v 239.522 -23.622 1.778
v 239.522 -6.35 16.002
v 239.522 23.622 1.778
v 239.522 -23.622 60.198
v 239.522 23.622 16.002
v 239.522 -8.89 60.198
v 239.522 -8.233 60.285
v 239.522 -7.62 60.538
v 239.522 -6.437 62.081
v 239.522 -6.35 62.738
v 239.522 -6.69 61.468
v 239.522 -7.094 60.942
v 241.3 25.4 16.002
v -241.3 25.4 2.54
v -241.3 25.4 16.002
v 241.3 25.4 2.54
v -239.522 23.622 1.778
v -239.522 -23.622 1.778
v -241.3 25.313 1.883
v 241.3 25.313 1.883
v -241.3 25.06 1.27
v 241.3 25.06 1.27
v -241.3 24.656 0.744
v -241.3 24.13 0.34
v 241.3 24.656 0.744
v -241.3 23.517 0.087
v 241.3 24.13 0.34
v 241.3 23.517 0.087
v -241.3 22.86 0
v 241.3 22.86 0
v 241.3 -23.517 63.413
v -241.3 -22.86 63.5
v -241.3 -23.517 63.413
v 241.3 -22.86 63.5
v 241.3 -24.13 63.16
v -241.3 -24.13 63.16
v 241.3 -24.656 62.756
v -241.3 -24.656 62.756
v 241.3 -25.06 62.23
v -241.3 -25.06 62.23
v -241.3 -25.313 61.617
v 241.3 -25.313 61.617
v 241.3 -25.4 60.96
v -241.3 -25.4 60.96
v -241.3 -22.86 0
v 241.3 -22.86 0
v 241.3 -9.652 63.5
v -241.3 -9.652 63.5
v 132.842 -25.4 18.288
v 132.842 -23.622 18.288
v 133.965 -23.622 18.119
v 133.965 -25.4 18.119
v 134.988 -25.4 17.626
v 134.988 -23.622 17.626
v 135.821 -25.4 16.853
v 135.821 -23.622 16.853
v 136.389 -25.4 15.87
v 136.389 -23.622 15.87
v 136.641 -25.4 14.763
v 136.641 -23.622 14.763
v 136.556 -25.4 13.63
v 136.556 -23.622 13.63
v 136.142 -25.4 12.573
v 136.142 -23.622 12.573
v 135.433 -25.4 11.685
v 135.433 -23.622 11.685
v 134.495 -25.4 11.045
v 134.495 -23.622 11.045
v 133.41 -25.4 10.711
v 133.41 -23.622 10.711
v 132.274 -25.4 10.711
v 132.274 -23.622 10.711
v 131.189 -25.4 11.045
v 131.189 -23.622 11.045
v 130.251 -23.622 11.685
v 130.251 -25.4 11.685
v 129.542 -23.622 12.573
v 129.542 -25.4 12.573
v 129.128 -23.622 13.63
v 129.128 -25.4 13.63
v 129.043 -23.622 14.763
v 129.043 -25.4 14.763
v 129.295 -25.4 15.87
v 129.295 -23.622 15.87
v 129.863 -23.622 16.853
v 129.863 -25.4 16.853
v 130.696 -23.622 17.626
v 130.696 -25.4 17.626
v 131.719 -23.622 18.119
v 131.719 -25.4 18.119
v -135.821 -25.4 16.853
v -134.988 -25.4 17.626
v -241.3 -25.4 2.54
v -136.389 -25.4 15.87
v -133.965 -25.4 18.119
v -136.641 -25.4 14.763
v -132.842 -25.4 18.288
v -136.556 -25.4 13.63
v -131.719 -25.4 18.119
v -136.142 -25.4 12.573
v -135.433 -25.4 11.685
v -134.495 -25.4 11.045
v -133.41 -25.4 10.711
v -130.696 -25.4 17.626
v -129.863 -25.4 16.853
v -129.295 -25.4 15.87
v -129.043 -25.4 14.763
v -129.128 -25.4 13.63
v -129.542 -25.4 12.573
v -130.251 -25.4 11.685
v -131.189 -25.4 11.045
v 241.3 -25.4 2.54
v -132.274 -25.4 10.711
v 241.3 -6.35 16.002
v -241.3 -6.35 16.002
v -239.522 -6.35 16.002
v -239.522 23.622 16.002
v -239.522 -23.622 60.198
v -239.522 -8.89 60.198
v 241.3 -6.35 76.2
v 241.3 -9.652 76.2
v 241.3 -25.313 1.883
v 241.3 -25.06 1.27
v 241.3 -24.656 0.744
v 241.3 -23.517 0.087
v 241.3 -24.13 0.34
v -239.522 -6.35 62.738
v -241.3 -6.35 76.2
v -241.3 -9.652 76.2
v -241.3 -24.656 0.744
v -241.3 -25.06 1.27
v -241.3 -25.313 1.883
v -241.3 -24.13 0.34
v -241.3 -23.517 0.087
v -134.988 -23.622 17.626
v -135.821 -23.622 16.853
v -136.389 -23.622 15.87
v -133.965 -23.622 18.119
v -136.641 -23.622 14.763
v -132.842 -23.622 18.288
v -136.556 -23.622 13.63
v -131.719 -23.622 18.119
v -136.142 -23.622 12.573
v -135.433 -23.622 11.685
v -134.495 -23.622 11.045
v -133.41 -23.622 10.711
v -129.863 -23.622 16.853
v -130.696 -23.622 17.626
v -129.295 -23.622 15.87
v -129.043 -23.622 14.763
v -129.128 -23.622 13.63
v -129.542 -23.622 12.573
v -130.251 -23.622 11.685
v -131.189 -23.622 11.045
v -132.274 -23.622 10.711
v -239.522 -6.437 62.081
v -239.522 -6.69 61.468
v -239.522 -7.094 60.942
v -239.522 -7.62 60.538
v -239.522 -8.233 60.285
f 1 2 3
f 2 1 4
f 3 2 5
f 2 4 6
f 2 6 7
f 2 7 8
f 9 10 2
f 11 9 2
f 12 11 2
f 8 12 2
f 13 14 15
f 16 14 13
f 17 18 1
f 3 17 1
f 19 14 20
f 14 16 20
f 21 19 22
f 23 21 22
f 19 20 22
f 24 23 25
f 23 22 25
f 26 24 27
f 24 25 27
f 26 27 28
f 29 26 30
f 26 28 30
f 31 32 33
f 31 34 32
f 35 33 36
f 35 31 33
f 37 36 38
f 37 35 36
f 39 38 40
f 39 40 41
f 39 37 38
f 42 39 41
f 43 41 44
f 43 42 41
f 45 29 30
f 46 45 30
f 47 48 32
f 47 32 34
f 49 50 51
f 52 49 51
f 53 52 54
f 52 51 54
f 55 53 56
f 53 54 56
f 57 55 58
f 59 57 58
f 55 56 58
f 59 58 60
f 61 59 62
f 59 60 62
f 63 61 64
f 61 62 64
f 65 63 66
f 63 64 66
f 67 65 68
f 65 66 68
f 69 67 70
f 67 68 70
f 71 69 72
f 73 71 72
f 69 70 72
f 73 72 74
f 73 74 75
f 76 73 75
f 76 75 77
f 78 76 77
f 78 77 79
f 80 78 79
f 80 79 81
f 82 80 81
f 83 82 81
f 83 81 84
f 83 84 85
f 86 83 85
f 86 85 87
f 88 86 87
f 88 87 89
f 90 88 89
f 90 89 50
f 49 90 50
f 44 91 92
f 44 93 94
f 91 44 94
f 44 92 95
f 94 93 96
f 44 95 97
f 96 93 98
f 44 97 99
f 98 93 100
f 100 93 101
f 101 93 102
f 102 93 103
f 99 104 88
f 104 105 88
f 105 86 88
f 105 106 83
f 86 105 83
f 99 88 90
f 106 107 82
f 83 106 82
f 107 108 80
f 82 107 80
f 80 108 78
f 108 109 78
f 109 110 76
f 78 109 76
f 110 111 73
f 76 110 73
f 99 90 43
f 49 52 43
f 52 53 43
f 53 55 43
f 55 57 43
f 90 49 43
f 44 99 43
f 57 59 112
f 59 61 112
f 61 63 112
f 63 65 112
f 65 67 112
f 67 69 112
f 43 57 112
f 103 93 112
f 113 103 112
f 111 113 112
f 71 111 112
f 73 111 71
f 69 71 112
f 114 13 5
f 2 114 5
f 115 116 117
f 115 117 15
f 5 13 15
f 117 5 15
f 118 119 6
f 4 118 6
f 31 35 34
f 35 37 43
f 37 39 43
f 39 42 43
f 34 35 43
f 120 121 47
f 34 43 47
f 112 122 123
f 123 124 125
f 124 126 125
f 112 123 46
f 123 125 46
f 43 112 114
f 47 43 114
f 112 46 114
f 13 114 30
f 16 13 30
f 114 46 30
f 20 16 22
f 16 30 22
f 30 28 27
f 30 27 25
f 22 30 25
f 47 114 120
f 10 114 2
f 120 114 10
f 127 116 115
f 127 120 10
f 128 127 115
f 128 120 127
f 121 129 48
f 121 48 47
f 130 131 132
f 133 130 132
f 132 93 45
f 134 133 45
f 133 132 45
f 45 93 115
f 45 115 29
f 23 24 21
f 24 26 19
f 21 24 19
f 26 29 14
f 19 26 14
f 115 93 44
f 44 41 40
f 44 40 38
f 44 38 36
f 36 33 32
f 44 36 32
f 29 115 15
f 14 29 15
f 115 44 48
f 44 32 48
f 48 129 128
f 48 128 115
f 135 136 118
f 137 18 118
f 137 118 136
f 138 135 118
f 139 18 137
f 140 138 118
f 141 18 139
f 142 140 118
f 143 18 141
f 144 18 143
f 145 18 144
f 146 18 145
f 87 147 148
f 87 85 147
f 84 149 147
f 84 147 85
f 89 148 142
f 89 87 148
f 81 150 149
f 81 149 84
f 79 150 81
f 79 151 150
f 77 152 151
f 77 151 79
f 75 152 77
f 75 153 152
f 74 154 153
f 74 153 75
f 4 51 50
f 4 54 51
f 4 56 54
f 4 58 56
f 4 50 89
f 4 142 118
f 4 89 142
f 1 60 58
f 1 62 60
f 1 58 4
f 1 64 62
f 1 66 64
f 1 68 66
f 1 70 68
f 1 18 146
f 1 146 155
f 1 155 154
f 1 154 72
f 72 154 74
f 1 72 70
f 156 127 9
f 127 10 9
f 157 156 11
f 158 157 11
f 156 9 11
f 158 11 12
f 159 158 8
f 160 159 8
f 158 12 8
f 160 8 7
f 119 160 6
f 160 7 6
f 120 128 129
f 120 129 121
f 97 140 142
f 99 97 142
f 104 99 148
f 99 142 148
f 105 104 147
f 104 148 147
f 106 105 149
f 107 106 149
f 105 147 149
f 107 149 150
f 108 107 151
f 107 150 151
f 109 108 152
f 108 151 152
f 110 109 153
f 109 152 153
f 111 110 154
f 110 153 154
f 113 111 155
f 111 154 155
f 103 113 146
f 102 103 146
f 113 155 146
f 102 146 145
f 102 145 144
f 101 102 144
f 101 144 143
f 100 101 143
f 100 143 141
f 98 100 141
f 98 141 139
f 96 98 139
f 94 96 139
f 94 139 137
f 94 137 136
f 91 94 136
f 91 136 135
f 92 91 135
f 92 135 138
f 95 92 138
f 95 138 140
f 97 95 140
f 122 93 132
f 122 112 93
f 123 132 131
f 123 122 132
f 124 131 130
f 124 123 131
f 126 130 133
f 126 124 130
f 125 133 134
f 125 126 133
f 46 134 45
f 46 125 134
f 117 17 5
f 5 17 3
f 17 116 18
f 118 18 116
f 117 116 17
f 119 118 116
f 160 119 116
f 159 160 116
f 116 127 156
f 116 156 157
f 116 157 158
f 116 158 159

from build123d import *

# Parameters (mm, degrees)
SKETCH1_W           = 482.6
SKETCH1_H           = 50.8
BOSS_EXTRUDE1_DEPTH = 76.2
CUT_EXTRUDE2_DEPTH  = 49.022
SKETCH3_W           = 482.6
SKETCH3_H           = 16.002
CUT_EXTRUDE3_DEPTH  = 31.75
SKETCH4_W           = 482.6
SKETCH4_H           = 15.748
CUT_EXTRUDE4_DEPTH  = 12.7
SHELL2_START        = -23.622
SHELL2_OUTLINE_W    = 479.044
SHELL2_OUTLINE_H    = 14.224
SHELL2_DEPTH        = 47.244
SKETCH5_W           = 1.778
SKETCH5_H           = 17.272
BOSS_EXTRUDE2_DEPTH = 44.45
FILLET1_R           = 2.54
SKETCH6_R           = 3.81
CUT_EXTRUDE5_DEPTH  = 44.45


# Read off the part's stored shape, not the designer's step: Shell2
with BuildPart() as part:
    # Sketch1 → Boss-Extrude1 (new body)
    with BuildSketch(Plane.XY):
        Rectangle(SKETCH1_W, SKETCH1_H)
    extrude(amount=BOSS_EXTRUDE1_DEPTH)

    # Sketch2 → Cut-Extrude2 (cut)
    with BuildSketch(Plane(origin=(0, 25.4, 0), x_dir=(1, 0, 0), z_dir=(0, 1, 0))):
        Polygon((241.3, -16.002), (-241.3, -16.002), (-241.3, -38.1), (-241.3, -60.198), (241.3, -60.198), align=None)
    extrude(amount=-CUT_EXTRUDE2_DEPTH, mode=Mode.SUBTRACT)

    # Sketch3 → Cut-Extrude3 (cut)
    with BuildSketch(Plane(origin=(0, 25.4, 0), x_dir=(1, 0, 0), z_dir=(0, 1, 0))):
        with Locations((0, -68.199)):
            Rectangle(SKETCH3_W, SKETCH3_H)
    extrude(amount=-CUT_EXTRUDE3_DEPTH, mode=Mode.SUBTRACT)

    # Sketch4 → Cut-Extrude4 (cut)
    with BuildSketch(Plane.XY.offset(76.2)):
        with Locations((0, -17.526)):
            Rectangle(SKETCH4_W, SKETCH4_H)
    extrude(amount=-CUT_EXTRUDE4_DEPTH, mode=Mode.SUBTRACT)

    # Shell2 outline → Shell2 (cut)
    with BuildSketch(Plane(origin=(0, 0, 0), x_dir=(1, 0, 0), z_dir=(0, 1, 0)).offset(SHELL2_START)):
        with Locations((0, -8.89)):
            Rectangle(SHELL2_OUTLINE_W, SHELL2_OUTLINE_H)
    extrude(amount=SHELL2_DEPTH, mode=Mode.SUBTRACT)

    # Sketch5 → Boss-Extrude2 (add)
    with BuildSketch(Plane(origin=(0, 0, 60.198), x_dir=(-1, 0, 0), z_dir=(0, 0, -1))):
        with Locations((240.411, -14.986)):
            Rectangle(SKETCH5_W, SKETCH5_H)
        with Locations((-240.411, -14.986)):
            Rectangle(SKETCH5_W, SKETCH5_H)
    extrude(amount=BOSS_EXTRUDE2_DEPTH)

    # Fillet1
    fillet1_edges = [part.edges().sort_by_distance(p)[0] for p in [
        (0, -25.4, 0),
        (0, -25.4, 63.5),
        (0, 25.4, 0),
        (0, -6.35, 60.198),
    ]]
    fillet(fillet1_edges, radius=FILLET1_R)

    # Sketch6 → Cut-Extrude5 (cut)
    with BuildSketch(Plane(origin=(0, -23.622, 0), x_dir=(1, 0, 0), z_dir=(0, 1, 0))):
        with Locations(Location((-132.842, -14.478, 0), (0, 0, 270))):
            Circle(SKETCH6_R)
        with Locations(Location((132.842, -14.478, 0), (0, 0, 270))):
            Circle(SKETCH6_R)
    extrude(amount=-CUT_EXTRUDE5_DEPTH, mode=Mode.SUBTRACT)


solid = part.part
